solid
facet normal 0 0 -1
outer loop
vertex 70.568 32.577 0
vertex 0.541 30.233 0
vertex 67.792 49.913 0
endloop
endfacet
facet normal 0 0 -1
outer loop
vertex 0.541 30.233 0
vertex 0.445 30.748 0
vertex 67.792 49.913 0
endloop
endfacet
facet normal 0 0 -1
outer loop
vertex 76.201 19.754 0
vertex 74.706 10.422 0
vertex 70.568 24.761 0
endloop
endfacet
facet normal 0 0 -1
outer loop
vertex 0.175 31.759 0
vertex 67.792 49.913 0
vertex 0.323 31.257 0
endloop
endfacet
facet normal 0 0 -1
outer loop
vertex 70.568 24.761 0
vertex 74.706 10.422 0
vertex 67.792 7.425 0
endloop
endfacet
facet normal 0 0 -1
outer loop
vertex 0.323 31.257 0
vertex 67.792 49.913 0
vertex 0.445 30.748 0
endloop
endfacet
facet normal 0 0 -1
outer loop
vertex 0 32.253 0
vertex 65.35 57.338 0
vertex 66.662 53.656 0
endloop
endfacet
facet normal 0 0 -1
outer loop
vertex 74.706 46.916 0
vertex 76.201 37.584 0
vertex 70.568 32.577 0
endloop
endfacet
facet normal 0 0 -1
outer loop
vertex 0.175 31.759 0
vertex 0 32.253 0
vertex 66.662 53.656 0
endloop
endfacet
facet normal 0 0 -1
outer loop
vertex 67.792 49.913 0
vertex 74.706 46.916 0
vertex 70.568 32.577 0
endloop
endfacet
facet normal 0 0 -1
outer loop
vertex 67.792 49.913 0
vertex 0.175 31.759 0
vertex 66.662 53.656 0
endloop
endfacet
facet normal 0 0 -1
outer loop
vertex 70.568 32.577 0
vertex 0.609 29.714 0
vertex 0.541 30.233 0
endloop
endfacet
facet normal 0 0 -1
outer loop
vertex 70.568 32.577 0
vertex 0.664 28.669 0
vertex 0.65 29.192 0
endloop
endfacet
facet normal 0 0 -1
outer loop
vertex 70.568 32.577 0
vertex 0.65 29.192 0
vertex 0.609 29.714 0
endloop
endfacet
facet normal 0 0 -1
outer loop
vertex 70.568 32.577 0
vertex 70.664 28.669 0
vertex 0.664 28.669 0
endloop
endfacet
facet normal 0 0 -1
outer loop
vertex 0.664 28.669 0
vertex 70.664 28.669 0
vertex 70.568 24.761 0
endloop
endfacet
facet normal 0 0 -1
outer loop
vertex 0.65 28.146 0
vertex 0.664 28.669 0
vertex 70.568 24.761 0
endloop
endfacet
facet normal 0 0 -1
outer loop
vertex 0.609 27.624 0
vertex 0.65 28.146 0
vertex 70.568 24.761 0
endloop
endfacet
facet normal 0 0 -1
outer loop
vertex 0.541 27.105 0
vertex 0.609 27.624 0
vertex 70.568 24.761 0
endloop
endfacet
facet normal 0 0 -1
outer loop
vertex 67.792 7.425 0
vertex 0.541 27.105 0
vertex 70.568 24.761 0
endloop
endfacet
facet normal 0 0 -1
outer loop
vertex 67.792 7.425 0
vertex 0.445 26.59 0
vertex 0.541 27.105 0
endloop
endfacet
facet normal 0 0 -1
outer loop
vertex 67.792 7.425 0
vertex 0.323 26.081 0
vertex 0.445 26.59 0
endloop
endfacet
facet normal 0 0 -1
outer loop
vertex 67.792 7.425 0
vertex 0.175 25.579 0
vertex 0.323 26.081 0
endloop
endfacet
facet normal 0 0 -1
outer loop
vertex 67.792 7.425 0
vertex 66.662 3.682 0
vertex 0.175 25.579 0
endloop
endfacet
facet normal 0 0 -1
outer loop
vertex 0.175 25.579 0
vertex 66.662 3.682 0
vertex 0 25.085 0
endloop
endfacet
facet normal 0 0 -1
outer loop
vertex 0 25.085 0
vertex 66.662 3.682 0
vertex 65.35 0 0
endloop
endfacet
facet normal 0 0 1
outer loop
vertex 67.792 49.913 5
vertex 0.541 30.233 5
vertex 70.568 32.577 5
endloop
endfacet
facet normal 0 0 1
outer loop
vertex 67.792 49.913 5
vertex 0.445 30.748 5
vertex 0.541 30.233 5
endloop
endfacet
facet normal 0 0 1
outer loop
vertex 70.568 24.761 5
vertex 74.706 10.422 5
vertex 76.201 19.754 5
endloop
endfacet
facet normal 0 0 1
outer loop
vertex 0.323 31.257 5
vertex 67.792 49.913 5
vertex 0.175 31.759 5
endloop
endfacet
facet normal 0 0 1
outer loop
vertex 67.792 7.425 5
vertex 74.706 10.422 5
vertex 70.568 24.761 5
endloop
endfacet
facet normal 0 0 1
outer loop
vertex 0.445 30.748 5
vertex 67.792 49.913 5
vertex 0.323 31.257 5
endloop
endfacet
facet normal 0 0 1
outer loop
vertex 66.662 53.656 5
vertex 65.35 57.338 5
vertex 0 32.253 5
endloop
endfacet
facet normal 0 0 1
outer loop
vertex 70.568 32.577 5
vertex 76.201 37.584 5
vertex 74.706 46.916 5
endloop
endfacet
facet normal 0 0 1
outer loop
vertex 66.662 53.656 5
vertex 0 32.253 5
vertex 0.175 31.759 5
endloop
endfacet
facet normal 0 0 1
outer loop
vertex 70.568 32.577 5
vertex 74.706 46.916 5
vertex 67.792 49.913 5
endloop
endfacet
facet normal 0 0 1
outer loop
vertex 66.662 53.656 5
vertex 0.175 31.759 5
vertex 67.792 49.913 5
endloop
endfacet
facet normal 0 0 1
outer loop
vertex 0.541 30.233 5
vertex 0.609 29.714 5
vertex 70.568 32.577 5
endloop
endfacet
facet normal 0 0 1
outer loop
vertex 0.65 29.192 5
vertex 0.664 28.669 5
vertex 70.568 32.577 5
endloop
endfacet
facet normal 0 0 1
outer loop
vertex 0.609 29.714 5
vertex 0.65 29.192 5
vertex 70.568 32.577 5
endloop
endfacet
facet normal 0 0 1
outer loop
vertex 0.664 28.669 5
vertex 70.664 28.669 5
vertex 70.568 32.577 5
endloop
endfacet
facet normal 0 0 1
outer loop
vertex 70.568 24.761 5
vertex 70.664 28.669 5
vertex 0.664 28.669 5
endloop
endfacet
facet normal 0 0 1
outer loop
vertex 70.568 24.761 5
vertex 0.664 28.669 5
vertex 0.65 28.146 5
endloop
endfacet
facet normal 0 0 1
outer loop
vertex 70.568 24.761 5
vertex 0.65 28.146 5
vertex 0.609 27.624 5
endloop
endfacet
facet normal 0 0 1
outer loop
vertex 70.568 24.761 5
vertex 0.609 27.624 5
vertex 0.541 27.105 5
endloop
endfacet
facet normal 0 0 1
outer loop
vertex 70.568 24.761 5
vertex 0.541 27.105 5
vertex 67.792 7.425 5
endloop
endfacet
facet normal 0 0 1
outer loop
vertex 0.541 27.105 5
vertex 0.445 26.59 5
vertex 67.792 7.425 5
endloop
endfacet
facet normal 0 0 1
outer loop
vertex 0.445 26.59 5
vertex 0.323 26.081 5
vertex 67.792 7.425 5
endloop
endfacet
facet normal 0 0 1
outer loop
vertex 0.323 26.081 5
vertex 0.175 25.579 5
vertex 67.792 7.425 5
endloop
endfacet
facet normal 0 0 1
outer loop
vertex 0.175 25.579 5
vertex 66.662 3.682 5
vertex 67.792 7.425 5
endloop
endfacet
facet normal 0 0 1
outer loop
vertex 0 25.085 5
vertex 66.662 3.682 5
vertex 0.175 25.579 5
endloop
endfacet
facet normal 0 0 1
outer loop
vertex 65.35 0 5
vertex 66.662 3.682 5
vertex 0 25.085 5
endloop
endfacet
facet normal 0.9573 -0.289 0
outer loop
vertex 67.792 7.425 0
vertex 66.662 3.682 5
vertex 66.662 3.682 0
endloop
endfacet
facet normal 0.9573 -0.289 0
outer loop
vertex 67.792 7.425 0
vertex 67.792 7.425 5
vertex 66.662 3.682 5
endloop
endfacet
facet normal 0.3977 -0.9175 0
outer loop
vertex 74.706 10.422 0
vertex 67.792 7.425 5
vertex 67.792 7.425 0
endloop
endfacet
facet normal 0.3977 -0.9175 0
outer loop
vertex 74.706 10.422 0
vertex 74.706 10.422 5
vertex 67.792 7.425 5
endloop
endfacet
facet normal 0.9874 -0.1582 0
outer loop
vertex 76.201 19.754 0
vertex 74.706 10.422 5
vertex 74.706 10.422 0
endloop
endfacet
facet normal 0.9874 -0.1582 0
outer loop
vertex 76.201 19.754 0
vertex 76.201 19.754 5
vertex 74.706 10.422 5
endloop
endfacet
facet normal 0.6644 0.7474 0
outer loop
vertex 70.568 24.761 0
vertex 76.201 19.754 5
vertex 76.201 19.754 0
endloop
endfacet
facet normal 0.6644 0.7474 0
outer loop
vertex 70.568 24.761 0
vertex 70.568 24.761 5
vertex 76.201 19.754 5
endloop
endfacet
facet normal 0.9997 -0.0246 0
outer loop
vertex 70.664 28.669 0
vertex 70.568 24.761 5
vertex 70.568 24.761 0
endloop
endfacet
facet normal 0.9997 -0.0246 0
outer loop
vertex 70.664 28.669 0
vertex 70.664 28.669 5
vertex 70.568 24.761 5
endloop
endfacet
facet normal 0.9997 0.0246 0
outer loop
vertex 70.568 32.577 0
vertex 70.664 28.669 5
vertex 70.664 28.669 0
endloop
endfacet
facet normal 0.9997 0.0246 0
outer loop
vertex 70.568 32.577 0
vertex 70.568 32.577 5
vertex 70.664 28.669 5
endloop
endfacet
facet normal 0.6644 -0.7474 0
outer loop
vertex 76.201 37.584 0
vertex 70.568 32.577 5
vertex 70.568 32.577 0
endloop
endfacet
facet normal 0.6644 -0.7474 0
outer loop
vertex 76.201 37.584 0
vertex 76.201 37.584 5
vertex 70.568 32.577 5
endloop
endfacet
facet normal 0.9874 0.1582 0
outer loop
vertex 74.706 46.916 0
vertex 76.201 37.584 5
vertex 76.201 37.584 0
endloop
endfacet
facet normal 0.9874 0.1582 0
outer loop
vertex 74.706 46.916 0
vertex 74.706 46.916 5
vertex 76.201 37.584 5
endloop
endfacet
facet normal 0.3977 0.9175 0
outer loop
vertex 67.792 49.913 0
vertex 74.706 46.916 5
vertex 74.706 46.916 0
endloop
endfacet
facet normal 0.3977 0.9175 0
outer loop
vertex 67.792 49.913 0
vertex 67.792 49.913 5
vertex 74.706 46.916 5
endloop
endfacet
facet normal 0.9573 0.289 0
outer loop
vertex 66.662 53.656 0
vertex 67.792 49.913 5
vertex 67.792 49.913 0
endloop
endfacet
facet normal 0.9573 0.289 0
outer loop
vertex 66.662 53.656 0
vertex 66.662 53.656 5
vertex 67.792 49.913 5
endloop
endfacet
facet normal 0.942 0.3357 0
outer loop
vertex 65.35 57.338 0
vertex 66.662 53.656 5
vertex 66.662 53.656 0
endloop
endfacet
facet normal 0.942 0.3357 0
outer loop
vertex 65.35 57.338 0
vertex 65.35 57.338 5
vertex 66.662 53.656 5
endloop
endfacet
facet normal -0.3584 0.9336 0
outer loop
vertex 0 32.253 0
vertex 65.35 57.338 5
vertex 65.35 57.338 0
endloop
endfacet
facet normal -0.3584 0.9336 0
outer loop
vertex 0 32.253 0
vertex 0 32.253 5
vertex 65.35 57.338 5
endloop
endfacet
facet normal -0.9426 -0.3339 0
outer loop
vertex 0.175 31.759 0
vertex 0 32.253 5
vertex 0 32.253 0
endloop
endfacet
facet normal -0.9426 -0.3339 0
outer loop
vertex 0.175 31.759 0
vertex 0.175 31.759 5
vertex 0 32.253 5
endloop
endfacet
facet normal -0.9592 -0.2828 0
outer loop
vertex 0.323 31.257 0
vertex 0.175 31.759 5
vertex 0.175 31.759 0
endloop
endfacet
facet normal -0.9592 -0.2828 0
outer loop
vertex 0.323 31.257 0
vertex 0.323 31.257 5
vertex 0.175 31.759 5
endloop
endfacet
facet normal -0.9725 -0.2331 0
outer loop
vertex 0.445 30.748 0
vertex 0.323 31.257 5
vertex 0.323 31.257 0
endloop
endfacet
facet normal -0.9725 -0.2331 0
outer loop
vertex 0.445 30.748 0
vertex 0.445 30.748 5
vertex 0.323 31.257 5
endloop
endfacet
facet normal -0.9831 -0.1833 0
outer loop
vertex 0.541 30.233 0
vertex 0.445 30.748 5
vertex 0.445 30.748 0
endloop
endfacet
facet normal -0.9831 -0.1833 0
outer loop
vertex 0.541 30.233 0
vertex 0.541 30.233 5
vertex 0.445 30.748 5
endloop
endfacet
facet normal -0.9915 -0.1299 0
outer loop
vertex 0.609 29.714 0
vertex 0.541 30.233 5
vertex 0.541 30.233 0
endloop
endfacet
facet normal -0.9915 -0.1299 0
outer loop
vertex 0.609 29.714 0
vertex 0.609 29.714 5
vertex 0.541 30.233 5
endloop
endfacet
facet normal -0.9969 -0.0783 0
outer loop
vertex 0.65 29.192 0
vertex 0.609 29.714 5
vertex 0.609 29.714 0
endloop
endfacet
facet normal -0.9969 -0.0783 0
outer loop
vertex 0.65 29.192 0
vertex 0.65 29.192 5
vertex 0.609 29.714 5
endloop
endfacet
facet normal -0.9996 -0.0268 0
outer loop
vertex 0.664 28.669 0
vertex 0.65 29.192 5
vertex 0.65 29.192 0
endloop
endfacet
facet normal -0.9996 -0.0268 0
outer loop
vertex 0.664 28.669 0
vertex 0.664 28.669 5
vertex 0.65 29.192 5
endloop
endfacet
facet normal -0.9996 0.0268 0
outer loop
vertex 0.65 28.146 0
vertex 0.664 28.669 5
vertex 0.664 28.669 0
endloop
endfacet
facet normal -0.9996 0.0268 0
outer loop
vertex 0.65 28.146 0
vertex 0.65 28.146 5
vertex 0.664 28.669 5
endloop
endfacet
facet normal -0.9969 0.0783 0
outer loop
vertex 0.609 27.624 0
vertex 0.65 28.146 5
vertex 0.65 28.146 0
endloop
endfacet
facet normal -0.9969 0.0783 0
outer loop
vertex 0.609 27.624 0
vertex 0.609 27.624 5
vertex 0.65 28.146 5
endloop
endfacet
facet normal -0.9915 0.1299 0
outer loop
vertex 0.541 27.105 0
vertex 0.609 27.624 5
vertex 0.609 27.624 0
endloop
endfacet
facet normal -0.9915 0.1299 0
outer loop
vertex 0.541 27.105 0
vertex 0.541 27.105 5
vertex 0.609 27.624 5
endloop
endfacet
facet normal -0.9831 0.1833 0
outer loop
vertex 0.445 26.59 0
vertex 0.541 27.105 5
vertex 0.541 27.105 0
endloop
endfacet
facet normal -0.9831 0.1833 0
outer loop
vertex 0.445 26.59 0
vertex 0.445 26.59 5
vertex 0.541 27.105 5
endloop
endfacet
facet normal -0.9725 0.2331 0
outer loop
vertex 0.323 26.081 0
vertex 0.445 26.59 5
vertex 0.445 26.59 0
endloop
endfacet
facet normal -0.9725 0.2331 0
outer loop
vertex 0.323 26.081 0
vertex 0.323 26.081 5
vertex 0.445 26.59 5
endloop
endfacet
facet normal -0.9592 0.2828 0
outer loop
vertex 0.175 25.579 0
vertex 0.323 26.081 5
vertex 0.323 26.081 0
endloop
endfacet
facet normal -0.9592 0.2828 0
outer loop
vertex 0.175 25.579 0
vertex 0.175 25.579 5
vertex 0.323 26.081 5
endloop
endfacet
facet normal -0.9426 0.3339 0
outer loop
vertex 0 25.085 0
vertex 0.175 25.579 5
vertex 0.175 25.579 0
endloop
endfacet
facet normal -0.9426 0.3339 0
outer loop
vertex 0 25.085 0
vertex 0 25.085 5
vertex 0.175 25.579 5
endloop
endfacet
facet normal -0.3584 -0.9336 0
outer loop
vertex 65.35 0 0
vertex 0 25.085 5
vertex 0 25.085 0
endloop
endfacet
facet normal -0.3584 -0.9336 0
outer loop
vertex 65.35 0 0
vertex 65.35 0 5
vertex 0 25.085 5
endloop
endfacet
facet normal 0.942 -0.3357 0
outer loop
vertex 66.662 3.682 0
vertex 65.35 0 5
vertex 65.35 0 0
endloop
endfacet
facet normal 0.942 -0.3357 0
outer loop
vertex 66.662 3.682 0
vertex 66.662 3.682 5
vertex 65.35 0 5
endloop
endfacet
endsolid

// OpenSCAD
$fn = 32;

// ----------------------------------------------------------------------
// Gear sector: 2 teeth on 42 degrees
// ----------------------------------------------------------------------

// --- parameters (mm) ---
sector_angle = 42;        // sector angle, degrees
root_r = 80;              // root circle radius
tooth_h = 6;              // tooth height over the root circle
teeth = 2;                // number of teeth on the sector
hub_r = 10;               // hub bore radius
plate_t = 5;              // sector thickness, Z
arc_step = 3;             // sampling step of the root/hub arcs, degrees

tip_r = root_r + tooth_h;  // tip circle radius

profile = [[65.35, 0], [66.662, 3.682], [67.792, 7.425], [74.706, 10.422], [76.201, 19.754], [70.568, 24.761], [70.664, 28.669], [70.568, 32.577], [76.201, 37.584], [74.706, 46.916], [67.792, 49.913], [66.662, 53.656], [65.35, 57.338], [0, 32.253], [0.175, 31.759], [0.323, 31.257], [0.445, 30.748], [0.541, 30.233], [0.609, 29.714], [0.65, 29.192], [0.664, 28.669], [0.65, 28.146], [0.609, 27.624], [0.541, 27.105], [0.445, 26.59], [0.323, 26.081], [0.175, 25.579], [0, 25.085]];  // primary outline, 28 points, counter clockwise

// --- the one profile operation ---
linear_extrude(height = plate_t) polygon(points = profile);
